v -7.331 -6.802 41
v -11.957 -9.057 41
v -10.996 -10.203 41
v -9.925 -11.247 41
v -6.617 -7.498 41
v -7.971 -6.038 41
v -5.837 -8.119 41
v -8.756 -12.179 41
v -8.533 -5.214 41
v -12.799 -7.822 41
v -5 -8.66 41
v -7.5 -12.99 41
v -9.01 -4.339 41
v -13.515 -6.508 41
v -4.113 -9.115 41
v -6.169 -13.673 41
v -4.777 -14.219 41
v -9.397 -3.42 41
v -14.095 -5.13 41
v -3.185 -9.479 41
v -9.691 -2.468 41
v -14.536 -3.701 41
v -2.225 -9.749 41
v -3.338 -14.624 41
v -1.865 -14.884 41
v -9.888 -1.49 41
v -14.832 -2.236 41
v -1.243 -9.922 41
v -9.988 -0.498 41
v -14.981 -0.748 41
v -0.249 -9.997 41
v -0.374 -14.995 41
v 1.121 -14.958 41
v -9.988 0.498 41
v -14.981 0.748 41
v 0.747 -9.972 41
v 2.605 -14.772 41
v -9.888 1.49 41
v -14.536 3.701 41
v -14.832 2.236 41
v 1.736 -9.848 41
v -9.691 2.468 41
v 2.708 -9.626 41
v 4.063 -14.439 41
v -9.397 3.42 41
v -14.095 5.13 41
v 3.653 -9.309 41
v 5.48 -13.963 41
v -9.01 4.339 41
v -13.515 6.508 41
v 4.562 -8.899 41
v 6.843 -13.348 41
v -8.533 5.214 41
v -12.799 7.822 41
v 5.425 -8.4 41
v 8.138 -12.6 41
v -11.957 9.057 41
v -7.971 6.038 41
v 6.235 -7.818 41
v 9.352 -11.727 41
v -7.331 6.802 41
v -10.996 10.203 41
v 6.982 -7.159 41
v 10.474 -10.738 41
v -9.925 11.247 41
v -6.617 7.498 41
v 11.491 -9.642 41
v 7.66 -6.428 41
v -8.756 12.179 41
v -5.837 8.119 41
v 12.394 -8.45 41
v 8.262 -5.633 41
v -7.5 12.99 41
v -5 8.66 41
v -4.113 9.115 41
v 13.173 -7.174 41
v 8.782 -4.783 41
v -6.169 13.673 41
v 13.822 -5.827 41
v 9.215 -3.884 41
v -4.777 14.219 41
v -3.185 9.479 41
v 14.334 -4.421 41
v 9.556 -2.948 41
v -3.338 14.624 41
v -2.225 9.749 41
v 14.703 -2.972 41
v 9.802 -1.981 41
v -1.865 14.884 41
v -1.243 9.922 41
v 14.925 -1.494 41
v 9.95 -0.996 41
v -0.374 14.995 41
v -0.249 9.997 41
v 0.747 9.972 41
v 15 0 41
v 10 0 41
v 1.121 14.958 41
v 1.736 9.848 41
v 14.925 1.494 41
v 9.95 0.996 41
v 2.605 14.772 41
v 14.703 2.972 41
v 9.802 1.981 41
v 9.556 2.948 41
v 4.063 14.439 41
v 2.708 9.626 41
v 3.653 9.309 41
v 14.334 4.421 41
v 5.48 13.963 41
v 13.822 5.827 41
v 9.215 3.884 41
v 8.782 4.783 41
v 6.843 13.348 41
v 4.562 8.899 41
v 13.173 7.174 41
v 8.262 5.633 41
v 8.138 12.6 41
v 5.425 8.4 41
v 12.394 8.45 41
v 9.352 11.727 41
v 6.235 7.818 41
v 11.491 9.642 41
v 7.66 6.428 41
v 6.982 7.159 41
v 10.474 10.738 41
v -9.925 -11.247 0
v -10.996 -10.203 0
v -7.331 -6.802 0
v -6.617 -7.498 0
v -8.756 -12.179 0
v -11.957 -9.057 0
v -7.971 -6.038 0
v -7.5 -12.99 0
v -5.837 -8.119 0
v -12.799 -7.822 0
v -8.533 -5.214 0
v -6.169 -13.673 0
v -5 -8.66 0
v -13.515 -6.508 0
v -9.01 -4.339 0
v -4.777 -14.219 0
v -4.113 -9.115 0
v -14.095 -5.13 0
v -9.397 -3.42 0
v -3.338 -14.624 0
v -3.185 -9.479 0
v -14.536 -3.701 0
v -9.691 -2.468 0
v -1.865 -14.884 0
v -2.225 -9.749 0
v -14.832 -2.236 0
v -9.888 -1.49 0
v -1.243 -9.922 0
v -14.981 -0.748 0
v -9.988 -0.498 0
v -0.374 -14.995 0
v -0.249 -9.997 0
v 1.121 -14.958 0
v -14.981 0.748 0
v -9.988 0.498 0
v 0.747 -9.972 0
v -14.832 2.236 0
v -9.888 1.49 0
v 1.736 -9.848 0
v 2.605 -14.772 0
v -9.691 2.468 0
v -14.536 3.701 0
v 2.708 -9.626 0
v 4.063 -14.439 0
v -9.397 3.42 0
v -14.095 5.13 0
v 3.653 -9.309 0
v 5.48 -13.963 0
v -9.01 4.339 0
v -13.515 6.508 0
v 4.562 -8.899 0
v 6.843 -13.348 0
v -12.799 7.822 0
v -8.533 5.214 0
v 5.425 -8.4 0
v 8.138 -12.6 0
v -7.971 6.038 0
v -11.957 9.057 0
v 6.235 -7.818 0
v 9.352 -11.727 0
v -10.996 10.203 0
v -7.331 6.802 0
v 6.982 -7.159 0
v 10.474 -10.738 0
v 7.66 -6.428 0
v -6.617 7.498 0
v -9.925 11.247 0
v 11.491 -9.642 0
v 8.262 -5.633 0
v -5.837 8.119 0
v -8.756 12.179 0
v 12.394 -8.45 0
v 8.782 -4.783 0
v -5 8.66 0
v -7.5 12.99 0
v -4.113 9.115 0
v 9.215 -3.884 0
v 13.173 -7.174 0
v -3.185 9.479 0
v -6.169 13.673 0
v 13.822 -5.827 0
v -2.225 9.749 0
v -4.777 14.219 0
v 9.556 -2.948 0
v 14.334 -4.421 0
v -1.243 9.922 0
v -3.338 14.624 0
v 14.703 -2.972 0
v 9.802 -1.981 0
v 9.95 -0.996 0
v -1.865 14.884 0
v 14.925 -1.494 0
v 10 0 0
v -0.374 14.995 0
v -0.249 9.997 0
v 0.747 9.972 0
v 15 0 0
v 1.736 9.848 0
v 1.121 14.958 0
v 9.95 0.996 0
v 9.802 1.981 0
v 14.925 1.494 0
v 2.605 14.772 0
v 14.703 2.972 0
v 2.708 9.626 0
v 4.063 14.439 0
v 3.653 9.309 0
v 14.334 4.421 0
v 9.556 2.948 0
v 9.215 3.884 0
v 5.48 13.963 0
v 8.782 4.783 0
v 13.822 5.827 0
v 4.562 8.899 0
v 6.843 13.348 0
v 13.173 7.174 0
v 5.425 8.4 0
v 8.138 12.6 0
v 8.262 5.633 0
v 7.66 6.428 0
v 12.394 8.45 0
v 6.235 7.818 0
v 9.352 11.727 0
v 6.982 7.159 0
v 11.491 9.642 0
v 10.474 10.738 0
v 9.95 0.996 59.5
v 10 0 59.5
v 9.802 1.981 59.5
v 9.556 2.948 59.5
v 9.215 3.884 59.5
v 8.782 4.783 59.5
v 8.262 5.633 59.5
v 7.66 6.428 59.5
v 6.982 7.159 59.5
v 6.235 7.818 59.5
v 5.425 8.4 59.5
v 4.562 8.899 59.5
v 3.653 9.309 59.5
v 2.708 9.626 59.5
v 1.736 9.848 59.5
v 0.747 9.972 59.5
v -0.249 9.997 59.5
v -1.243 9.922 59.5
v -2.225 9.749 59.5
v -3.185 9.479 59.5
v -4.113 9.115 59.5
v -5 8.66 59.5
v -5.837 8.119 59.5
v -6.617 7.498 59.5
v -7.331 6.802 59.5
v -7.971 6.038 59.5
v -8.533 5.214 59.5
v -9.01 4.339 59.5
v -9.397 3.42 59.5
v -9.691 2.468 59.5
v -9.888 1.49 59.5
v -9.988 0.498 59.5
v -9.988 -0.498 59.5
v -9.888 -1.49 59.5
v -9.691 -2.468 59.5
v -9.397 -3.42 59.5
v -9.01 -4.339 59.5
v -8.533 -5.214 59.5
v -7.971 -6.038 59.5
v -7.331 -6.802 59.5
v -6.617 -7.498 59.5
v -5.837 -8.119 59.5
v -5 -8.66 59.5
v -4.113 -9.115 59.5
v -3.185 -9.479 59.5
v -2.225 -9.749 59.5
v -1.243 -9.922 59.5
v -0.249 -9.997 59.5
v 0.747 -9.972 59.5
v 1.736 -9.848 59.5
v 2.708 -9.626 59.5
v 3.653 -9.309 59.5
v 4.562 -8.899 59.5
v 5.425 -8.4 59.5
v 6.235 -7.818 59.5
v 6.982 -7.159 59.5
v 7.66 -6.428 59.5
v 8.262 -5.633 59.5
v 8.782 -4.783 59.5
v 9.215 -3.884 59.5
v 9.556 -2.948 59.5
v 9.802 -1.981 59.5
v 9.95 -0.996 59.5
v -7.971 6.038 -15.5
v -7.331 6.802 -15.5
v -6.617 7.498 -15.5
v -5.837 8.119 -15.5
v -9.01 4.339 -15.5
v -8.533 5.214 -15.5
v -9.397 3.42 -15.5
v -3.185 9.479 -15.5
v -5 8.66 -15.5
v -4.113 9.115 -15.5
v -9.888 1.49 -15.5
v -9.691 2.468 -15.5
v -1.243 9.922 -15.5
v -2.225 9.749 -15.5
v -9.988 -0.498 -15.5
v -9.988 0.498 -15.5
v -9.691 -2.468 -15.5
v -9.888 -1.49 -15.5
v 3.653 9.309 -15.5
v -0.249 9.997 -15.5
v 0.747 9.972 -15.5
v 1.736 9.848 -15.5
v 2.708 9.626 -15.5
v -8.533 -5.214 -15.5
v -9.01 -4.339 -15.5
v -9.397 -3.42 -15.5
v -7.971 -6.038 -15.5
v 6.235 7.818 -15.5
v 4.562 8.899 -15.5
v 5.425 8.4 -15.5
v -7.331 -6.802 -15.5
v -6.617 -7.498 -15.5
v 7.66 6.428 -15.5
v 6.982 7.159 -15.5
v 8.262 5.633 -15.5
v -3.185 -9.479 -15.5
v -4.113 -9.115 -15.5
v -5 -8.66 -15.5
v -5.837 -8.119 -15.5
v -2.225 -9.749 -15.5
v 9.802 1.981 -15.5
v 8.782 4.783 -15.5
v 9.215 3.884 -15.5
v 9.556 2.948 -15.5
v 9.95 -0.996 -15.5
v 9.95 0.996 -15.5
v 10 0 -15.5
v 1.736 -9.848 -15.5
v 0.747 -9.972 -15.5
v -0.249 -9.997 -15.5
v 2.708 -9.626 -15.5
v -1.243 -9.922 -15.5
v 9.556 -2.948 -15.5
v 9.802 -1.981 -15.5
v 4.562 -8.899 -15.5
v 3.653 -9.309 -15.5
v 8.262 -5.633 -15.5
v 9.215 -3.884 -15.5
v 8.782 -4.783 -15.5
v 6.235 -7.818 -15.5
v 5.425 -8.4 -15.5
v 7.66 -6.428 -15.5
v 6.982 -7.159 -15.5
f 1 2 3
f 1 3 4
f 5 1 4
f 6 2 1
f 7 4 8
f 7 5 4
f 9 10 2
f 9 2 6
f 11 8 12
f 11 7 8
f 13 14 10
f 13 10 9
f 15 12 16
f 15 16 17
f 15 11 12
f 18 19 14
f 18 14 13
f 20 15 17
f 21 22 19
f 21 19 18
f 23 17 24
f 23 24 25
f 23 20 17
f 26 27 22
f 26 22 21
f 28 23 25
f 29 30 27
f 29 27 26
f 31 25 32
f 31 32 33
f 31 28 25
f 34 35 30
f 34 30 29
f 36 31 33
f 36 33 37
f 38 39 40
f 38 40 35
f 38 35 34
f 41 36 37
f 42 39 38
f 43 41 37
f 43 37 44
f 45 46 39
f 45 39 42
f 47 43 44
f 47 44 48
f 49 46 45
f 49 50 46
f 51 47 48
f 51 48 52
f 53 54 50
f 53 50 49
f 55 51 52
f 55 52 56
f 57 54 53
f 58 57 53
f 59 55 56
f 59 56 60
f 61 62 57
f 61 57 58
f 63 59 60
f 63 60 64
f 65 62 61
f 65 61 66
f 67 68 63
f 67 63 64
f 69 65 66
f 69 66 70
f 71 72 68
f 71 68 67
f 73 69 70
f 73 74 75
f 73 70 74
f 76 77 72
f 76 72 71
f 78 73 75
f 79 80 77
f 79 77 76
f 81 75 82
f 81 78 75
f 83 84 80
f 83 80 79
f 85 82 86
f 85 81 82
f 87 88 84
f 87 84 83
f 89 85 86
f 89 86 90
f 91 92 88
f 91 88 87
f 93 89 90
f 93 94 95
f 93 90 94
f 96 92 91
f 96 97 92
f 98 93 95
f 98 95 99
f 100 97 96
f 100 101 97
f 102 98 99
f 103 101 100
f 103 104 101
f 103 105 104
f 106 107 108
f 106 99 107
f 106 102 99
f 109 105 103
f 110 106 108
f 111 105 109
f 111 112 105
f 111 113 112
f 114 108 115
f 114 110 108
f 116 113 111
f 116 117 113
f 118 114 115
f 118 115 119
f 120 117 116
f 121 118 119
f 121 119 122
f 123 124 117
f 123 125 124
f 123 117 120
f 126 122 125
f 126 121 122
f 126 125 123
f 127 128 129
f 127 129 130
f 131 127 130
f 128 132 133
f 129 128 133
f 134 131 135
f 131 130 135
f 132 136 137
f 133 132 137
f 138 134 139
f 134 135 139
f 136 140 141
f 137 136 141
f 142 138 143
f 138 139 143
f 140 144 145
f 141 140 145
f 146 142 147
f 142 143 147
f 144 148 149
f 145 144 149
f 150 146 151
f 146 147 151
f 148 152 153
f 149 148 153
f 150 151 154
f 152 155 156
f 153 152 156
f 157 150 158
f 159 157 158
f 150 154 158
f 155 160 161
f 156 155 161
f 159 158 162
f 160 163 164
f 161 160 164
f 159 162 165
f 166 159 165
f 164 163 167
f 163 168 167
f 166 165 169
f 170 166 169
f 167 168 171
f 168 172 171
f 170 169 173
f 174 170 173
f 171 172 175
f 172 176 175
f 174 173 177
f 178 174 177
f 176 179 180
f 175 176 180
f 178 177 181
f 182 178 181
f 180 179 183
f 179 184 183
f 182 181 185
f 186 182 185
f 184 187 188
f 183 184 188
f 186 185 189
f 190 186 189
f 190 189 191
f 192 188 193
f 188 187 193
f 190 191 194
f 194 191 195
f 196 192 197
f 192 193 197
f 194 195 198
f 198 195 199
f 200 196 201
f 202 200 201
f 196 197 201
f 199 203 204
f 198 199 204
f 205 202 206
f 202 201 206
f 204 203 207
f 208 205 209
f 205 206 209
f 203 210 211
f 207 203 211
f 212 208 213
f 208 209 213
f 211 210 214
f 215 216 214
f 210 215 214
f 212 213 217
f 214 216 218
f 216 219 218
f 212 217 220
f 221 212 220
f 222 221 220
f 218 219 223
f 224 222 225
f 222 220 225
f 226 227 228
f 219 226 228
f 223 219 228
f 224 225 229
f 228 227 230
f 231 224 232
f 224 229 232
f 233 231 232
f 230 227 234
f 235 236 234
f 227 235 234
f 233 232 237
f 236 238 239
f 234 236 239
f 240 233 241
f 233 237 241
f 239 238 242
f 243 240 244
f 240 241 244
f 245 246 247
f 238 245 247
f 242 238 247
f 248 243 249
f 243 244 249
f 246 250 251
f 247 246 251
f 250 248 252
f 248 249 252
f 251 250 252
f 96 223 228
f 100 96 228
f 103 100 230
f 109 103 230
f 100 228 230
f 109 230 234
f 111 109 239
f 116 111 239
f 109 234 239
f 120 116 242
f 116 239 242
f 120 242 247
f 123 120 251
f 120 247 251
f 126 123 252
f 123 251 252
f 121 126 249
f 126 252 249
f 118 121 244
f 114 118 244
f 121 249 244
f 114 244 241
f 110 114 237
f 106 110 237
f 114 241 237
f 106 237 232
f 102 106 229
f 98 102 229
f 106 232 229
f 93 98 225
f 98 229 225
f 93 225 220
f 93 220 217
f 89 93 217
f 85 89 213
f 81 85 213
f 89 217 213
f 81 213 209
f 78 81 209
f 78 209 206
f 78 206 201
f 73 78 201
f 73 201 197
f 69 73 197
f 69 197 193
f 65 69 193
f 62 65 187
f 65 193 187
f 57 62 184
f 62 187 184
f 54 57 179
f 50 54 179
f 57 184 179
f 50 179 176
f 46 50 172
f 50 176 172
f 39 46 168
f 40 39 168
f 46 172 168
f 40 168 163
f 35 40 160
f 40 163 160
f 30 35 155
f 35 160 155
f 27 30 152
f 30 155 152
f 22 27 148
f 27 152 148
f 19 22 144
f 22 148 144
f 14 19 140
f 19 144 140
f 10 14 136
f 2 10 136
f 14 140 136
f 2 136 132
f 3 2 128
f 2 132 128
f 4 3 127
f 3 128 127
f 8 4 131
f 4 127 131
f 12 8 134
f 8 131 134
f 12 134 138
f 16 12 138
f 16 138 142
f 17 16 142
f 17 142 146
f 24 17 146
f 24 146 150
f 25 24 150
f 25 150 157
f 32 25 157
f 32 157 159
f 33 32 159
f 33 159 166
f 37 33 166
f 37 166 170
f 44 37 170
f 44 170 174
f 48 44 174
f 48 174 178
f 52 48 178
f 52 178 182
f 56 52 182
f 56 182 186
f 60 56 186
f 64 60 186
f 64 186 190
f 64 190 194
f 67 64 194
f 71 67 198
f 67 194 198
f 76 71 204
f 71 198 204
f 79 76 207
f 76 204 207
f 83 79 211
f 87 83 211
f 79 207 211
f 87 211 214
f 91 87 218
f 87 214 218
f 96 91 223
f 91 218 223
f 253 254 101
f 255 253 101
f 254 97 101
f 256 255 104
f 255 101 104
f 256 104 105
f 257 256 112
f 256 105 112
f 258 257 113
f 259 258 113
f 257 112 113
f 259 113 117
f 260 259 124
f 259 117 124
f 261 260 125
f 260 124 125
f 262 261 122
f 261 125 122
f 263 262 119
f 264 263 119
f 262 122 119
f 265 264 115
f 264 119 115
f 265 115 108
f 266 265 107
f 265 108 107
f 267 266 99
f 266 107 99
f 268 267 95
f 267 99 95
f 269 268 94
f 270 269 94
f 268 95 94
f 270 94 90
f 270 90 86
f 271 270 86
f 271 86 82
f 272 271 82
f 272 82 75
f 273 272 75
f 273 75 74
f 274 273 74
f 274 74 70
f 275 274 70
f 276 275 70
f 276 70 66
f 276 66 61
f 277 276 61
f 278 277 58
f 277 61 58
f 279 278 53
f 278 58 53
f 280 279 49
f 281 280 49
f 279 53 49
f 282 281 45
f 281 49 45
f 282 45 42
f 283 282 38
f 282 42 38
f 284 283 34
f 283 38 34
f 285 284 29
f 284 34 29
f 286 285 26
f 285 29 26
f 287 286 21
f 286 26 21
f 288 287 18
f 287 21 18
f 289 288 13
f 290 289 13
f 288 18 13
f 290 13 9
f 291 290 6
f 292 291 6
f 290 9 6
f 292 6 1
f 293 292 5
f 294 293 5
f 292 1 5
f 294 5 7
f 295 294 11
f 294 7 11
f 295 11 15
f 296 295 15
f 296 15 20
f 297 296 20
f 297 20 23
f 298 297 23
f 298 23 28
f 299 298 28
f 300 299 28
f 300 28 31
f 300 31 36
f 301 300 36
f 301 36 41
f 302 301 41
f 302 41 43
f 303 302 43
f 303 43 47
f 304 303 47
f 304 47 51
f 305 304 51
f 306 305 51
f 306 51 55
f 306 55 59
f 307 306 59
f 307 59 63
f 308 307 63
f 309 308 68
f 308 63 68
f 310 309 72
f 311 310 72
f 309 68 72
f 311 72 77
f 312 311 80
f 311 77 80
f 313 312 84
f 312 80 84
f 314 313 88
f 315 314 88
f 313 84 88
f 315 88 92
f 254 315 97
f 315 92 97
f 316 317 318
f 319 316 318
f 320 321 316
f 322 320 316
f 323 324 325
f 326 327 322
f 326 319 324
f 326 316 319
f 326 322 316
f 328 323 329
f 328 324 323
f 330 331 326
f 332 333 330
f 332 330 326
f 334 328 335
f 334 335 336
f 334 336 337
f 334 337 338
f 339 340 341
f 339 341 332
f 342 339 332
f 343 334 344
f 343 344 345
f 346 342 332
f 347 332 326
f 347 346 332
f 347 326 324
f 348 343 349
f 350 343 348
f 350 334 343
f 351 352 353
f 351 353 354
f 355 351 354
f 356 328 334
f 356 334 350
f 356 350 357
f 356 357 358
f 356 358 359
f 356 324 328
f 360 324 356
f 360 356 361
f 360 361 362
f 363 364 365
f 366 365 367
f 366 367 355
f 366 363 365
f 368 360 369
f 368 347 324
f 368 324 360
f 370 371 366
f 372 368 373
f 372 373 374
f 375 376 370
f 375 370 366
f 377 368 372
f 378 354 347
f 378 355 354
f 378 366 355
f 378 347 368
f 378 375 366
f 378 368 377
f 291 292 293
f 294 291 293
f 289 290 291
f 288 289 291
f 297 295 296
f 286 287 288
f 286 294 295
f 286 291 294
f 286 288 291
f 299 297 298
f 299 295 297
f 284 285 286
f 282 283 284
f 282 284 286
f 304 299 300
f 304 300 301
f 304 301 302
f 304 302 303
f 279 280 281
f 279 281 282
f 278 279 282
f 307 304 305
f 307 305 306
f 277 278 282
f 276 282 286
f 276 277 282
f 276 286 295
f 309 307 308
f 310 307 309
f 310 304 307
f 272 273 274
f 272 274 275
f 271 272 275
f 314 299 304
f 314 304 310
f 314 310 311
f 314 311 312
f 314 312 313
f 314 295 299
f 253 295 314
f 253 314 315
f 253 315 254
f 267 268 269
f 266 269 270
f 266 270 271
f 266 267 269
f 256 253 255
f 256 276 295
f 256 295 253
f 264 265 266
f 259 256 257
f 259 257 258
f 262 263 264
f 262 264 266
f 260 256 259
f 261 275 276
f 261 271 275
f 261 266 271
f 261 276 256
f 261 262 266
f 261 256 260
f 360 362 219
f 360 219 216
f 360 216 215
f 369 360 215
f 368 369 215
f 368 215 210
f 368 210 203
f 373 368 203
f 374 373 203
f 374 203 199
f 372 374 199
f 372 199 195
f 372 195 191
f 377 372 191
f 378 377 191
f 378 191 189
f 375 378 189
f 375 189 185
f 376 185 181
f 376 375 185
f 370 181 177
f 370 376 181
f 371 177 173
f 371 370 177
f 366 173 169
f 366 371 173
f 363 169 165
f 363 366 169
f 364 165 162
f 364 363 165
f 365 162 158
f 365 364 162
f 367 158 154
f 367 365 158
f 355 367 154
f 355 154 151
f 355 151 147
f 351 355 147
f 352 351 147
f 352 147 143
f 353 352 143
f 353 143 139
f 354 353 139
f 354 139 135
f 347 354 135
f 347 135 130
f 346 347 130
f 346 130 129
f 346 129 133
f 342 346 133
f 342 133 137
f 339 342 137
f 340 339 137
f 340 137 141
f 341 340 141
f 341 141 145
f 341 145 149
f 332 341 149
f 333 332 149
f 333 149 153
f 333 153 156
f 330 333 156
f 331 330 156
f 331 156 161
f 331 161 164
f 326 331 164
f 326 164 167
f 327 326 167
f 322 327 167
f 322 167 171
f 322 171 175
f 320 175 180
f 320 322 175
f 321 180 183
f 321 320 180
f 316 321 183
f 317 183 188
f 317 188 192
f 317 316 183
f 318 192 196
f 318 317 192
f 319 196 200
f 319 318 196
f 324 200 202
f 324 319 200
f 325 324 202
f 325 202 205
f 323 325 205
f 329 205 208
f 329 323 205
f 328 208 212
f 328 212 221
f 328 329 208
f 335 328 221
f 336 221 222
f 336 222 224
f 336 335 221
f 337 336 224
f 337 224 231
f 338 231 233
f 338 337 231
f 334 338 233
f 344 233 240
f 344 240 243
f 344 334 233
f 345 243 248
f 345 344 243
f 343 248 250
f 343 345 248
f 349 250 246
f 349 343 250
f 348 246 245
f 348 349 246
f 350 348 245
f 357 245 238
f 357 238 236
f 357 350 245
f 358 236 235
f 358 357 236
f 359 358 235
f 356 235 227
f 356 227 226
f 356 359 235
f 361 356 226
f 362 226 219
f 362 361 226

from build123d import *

# Parameters (mm, degrees)
SKETCH1_R           = 15
BOSS_EXTRUDE1_DEPTH = 41
SKETCH2_R           = 10
BOSS_EXTRUDE2_DEPTH = 8.5
BOSS_EXTRUDE3_START = 5.5
SKETCH3_R           = 10
BOSS_EXTRUDE3_DEPTH = 5.5
SKETCH4_R           = 10
BOSS_EXTRUDE4_DEPTH = 10
BOSS_EXTRUDE5_START = 10
SKETCH5_R           = 10
BOSS_EXTRUDE5_DEPTH = 10


with BuildPart() as part:
    # Sketch1 → Boss-Extrude1 (new body)
    with BuildSketch(Plane.XY):
        Circle(SKETCH1_R)
    extrude(amount=BOSS_EXTRUDE1_DEPTH)

    # Sketch2 → Boss-Extrude2 (add)
    with BuildSketch(Plane.XY.offset(41)):
        Circle(SKETCH2_R)
    extrude(amount=BOSS_EXTRUDE2_DEPTH)

    # Sketch3 → Boss-Extrude3 (add)
    with BuildSketch(Plane(origin=(0, 0, 0), x_dir=(-1, 0, 0), z_dir=(0, 0, -1)).offset(BOSS_EXTRUDE3_START)):
        with Locations(Location((0, 0, 0), (0, 0, 180))):
            Circle(SKETCH3_R)
    extrude(amount=-BOSS_EXTRUDE3_DEPTH)

    # Sketch4 → Boss-Extrude4 (add)
    with BuildSketch(Plane.XY.offset(49.5)):
        Circle(SKETCH4_R)
    extrude(amount=BOSS_EXTRUDE4_DEPTH)

    # Sketch5 → Boss-Extrude5 (add)
    with BuildSketch(Plane(origin=(0, 0, -5.5), x_dir=(-1, 0, 0), z_dir=(0, 0, -1)).offset(BOSS_EXTRUDE5_START)):
        with Locations(Location((0, 0, 0), (0, 0, 180))):
            Circle(SKETCH5_R)
    extrude(amount=-BOSS_EXTRUDE5_DEPTH)


solid = part.part
